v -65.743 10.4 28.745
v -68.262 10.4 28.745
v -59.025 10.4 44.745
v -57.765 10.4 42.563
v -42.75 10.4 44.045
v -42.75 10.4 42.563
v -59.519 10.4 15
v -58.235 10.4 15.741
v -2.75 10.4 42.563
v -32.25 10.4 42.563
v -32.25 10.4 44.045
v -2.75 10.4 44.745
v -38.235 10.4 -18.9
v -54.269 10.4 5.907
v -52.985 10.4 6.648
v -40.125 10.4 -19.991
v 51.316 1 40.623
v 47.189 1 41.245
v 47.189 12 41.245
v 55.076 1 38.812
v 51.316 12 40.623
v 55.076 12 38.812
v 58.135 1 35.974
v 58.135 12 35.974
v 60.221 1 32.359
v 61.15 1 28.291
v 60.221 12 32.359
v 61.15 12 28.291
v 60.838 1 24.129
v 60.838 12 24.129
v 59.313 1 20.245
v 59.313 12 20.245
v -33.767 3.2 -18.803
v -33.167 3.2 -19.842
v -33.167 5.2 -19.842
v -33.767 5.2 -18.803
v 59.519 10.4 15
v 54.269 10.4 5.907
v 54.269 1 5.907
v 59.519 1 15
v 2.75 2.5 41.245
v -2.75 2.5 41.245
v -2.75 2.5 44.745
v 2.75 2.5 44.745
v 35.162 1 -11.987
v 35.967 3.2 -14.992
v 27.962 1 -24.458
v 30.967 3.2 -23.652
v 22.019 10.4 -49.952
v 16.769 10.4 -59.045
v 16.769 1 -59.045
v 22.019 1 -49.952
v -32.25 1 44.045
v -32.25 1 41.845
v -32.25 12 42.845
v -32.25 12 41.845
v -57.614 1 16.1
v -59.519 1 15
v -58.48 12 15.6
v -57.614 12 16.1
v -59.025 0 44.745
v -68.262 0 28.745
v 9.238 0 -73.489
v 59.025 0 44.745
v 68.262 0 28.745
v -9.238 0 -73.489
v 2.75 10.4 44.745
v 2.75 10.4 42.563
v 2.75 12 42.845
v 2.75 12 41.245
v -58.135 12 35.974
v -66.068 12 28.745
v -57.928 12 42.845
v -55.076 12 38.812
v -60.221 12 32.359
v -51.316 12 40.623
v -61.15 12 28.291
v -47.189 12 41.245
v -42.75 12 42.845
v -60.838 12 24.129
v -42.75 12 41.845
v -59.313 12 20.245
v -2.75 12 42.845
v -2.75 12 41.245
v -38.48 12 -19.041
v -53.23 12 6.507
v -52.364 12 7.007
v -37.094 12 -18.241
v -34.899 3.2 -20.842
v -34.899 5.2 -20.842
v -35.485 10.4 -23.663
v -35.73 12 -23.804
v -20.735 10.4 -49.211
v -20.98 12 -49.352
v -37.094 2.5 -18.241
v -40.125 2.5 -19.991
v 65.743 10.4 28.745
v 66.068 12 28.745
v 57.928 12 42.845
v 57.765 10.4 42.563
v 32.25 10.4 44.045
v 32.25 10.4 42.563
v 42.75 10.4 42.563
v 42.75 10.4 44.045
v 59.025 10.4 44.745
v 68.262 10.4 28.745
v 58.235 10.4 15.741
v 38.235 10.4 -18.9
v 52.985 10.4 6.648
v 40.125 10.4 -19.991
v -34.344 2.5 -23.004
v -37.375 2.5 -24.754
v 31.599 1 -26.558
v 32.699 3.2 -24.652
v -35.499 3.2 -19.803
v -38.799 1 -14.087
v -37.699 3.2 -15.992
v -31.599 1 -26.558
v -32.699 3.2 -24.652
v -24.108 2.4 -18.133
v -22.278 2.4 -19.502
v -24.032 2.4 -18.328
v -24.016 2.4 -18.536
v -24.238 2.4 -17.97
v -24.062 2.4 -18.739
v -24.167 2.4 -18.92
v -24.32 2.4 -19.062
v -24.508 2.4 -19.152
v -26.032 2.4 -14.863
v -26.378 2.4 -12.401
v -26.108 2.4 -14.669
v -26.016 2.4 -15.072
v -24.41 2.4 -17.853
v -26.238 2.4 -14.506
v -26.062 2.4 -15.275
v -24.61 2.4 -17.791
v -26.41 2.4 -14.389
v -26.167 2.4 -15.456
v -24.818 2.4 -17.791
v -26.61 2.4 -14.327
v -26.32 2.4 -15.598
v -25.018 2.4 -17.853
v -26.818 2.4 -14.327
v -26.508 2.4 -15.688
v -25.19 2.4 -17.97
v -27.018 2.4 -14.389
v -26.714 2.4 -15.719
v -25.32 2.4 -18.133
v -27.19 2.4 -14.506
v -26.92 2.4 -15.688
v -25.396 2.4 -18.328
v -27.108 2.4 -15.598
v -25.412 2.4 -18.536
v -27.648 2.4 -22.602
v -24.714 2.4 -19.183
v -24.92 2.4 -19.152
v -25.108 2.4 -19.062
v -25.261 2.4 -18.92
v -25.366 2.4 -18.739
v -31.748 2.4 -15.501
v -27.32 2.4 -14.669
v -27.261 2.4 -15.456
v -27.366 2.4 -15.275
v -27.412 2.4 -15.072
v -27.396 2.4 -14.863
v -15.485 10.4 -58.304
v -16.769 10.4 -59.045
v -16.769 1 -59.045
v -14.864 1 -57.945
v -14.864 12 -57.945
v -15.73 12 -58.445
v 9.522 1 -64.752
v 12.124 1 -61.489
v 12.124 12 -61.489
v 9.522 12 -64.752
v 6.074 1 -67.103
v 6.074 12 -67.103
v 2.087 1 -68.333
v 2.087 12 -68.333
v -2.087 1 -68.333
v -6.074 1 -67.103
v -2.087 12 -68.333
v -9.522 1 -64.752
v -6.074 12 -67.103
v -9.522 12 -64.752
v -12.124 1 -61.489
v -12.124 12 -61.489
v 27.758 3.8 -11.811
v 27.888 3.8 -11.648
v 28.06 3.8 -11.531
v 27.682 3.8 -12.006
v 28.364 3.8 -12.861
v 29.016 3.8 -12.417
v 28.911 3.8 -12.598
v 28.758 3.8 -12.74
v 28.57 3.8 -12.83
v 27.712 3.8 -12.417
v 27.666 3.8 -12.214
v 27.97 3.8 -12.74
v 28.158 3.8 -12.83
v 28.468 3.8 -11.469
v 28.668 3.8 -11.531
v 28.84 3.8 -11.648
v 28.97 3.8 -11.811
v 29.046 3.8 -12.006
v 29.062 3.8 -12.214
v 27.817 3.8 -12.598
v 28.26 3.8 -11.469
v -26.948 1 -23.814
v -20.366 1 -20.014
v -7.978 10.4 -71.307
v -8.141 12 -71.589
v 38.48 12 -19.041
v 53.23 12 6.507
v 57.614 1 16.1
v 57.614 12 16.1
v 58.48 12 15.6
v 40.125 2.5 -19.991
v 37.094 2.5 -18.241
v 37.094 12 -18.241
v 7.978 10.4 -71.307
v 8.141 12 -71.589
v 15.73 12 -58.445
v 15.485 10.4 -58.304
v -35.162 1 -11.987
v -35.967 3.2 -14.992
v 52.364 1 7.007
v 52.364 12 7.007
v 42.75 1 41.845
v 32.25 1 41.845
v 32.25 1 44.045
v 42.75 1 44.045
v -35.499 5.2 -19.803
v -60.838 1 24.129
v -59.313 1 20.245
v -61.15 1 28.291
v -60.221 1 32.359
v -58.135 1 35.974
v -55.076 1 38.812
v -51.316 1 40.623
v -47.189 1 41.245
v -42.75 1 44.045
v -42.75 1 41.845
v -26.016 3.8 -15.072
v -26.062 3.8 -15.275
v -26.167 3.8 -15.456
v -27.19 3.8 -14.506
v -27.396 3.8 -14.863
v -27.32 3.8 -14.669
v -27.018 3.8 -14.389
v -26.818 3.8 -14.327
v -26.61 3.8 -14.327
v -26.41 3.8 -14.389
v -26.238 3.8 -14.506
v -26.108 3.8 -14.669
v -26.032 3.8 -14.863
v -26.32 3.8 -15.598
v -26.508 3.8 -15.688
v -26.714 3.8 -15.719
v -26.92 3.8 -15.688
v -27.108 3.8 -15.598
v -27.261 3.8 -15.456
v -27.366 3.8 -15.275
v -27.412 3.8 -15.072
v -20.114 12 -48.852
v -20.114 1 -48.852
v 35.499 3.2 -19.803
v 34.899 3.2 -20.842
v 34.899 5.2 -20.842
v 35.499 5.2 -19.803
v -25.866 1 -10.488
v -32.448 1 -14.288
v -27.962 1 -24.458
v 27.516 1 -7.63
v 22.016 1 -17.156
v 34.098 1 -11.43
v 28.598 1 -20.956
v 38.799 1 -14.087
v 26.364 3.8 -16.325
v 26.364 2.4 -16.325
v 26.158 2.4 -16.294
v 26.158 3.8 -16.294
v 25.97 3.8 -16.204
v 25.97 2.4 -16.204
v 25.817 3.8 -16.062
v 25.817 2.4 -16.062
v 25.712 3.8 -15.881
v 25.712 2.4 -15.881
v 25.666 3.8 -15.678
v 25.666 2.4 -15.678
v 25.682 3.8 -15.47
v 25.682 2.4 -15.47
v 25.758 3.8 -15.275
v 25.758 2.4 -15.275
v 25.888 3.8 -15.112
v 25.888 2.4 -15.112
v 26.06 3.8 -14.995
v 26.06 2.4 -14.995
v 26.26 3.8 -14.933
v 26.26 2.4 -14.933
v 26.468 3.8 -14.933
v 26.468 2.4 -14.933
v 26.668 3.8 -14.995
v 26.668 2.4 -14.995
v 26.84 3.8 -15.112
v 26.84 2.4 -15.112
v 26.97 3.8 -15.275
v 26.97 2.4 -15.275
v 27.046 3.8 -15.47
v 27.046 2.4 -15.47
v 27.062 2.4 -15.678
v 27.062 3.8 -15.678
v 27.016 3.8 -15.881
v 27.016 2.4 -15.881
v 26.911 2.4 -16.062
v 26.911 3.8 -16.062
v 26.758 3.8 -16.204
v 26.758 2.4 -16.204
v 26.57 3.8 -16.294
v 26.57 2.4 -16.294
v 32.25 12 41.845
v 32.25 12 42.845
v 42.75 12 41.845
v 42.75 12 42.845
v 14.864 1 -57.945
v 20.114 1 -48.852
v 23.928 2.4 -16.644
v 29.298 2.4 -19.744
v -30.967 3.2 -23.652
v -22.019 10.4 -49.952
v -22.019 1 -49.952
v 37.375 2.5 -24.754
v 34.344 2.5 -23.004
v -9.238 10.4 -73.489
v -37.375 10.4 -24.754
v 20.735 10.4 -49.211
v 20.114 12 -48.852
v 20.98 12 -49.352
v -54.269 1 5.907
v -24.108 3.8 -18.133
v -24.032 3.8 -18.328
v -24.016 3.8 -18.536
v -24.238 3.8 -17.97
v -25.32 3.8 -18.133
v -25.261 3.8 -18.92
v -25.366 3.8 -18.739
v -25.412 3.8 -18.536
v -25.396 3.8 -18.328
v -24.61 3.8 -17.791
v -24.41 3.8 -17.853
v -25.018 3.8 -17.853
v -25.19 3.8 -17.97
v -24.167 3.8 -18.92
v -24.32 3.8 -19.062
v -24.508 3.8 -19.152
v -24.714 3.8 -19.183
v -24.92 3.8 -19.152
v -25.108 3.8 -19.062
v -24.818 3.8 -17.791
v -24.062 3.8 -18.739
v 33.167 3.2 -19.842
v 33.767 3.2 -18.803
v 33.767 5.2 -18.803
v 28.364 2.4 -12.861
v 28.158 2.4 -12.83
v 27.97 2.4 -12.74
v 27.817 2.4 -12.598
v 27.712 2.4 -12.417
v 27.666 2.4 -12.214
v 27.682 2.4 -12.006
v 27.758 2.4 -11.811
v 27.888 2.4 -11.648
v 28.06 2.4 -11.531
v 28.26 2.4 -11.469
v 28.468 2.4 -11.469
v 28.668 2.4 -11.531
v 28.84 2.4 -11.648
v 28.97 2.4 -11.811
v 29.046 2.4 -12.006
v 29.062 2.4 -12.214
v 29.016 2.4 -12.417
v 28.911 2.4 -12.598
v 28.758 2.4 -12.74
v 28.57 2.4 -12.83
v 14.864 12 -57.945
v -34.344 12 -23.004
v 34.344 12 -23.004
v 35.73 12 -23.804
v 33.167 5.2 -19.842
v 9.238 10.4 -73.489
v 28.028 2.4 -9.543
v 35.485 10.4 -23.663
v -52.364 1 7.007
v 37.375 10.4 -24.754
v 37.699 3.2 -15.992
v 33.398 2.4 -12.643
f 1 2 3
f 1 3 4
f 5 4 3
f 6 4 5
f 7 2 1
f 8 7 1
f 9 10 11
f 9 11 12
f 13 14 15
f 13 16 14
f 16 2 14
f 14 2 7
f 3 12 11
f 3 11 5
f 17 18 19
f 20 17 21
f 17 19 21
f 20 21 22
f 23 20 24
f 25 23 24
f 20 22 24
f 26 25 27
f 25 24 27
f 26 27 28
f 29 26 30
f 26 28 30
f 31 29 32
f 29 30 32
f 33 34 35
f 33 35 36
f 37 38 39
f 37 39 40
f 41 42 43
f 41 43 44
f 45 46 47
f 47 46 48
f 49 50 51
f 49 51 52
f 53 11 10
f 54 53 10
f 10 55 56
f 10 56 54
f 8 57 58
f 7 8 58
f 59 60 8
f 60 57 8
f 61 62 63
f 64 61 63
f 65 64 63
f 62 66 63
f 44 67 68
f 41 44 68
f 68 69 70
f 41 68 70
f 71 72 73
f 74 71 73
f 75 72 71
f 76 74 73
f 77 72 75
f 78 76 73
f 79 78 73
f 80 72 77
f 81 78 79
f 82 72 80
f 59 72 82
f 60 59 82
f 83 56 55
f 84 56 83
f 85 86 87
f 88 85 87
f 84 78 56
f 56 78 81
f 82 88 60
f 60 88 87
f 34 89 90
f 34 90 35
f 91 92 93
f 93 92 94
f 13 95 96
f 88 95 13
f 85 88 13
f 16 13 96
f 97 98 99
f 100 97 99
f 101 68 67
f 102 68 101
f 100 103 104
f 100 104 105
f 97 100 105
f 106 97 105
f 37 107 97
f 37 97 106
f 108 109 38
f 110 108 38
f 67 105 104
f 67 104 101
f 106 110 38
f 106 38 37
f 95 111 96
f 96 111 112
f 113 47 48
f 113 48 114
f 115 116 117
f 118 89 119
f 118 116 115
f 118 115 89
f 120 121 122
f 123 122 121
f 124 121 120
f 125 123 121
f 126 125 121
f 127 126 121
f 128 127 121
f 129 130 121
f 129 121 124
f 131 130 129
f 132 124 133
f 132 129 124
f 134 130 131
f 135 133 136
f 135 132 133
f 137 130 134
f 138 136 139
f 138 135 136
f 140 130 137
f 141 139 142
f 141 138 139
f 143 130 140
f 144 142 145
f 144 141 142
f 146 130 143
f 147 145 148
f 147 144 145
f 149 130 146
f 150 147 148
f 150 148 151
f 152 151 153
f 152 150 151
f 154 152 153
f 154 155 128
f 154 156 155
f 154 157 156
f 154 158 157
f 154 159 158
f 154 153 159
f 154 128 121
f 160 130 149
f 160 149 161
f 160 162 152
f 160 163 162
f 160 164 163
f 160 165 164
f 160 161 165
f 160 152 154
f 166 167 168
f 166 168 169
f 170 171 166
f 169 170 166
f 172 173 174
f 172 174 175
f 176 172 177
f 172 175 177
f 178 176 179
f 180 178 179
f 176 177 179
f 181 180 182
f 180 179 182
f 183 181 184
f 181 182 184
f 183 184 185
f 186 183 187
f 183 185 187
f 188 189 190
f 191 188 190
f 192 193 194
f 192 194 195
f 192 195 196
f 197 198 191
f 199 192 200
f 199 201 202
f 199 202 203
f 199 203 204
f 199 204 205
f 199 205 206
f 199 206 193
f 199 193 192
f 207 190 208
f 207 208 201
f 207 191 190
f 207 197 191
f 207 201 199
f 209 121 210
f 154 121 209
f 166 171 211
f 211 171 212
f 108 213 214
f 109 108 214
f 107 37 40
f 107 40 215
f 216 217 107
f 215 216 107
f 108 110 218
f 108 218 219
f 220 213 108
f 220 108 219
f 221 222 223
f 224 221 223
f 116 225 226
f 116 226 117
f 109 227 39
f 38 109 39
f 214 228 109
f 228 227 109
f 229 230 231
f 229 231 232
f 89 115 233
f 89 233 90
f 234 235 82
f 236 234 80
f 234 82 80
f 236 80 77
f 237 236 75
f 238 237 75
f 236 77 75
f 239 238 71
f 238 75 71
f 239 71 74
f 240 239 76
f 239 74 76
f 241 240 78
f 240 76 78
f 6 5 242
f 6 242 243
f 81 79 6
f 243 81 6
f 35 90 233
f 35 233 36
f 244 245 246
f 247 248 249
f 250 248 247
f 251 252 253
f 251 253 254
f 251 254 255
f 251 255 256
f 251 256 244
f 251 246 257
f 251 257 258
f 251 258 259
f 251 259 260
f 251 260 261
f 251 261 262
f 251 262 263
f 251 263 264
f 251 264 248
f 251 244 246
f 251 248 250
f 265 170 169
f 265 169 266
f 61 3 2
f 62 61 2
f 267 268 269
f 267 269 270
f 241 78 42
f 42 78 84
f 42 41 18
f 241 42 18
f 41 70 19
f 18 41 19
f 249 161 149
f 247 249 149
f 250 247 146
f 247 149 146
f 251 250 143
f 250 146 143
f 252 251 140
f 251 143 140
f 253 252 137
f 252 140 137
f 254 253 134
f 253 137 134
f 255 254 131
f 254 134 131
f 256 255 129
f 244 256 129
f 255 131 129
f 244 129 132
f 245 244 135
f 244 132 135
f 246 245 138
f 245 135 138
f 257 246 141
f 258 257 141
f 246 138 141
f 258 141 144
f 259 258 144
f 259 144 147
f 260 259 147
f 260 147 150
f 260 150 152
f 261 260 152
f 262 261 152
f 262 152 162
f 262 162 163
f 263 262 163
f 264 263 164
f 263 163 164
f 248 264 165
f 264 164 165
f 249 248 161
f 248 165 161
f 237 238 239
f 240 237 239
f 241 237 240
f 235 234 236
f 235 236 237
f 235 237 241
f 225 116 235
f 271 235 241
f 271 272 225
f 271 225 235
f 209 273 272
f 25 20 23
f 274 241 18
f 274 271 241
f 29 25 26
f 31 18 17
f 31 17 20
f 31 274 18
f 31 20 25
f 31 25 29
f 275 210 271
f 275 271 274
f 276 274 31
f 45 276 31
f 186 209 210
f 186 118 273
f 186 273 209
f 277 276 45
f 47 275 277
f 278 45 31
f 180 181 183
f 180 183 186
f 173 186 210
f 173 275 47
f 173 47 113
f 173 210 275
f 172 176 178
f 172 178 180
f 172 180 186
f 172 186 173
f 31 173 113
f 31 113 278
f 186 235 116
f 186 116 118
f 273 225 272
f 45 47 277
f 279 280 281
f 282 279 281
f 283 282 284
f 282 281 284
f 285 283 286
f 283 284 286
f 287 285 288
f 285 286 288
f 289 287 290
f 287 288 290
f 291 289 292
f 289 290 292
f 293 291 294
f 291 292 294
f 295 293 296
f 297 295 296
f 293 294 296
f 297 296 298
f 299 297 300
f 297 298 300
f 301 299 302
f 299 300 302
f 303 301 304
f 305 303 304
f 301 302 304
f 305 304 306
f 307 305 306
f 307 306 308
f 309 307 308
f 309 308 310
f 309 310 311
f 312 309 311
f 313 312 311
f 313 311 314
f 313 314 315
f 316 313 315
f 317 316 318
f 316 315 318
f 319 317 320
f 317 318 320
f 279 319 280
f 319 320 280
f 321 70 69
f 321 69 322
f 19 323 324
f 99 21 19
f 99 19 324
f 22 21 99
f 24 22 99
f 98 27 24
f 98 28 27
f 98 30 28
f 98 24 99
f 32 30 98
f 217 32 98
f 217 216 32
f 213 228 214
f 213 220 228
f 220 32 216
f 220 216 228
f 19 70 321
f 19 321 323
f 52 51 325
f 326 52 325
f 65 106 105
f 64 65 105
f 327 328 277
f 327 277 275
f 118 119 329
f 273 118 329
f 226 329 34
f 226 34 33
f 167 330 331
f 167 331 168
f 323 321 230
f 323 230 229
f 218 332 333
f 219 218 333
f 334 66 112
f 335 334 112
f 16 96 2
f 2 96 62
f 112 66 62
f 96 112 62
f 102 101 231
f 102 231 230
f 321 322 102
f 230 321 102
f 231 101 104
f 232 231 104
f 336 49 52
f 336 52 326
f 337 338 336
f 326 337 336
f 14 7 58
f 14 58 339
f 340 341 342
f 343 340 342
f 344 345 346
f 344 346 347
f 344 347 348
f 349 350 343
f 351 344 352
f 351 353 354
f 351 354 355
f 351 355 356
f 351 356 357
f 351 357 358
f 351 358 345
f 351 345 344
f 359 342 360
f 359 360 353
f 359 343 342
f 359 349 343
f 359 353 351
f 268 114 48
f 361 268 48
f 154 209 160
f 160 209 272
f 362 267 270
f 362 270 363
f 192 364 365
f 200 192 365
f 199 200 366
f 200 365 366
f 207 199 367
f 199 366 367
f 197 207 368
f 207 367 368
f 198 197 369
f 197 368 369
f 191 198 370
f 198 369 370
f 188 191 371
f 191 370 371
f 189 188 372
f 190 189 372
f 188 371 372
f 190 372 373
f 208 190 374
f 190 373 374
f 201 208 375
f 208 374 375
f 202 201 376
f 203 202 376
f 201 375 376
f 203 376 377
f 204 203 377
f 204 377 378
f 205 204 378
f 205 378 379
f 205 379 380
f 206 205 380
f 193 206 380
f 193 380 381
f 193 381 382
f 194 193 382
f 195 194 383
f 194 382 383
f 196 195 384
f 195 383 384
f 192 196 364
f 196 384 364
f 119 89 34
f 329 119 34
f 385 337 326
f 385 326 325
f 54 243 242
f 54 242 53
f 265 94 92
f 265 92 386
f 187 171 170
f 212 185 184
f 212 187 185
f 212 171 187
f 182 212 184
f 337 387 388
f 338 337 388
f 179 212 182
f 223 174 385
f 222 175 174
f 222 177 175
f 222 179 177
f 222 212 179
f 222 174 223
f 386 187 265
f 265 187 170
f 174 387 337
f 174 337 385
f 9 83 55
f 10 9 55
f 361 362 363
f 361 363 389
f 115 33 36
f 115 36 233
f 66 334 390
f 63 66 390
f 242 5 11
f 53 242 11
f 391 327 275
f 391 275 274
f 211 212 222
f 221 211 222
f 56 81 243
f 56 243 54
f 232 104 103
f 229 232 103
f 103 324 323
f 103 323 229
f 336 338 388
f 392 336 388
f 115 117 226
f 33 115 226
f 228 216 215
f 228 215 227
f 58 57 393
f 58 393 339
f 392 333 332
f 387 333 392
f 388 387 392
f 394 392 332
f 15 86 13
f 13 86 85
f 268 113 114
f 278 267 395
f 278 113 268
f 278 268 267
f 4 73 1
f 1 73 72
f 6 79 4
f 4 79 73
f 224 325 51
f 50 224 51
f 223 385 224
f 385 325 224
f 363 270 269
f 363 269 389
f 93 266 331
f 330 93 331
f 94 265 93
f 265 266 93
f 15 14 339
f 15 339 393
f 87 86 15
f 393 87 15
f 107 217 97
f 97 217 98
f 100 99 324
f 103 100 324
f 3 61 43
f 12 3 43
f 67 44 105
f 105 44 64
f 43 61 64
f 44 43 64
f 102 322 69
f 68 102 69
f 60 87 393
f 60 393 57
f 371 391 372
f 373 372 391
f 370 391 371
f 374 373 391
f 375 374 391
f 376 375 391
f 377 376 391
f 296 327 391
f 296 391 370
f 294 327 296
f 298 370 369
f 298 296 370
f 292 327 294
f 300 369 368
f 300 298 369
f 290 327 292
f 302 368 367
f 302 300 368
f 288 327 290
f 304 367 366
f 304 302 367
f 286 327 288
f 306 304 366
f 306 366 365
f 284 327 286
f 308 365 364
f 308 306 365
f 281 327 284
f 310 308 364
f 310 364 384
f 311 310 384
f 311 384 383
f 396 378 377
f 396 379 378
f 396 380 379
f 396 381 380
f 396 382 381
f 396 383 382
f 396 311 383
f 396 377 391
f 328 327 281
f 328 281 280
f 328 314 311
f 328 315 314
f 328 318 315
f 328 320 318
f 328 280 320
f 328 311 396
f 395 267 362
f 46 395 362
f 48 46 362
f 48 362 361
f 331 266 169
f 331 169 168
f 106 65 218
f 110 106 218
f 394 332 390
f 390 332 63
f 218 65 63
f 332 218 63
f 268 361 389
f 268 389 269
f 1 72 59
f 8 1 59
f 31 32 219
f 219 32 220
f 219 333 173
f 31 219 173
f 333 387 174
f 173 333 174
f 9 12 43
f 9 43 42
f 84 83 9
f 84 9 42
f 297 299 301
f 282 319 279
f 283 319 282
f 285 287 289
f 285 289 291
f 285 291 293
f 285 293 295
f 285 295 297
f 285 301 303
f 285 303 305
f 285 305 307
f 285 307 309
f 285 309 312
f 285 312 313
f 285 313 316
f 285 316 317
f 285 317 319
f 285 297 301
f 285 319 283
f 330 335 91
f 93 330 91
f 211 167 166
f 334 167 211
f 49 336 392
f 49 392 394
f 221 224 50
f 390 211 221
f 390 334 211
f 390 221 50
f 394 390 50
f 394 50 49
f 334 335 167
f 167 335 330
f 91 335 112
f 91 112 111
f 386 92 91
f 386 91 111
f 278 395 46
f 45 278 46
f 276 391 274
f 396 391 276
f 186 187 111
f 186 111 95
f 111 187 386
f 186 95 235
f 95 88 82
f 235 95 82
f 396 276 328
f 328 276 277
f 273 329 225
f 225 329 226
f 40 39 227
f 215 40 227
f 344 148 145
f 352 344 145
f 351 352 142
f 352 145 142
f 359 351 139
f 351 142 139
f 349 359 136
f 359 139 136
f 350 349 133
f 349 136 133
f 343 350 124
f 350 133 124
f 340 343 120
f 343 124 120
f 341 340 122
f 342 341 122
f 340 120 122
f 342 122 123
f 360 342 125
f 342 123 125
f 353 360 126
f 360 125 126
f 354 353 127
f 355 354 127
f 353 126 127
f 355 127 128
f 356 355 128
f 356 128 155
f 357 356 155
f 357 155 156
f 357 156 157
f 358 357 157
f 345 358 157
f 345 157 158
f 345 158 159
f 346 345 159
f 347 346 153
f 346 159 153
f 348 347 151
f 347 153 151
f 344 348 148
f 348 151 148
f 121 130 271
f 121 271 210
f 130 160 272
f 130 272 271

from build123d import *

# Parameters (mm, degrees)
BOSS_EXTRU_1_DEPTH                        = 12
ENL_V_MAT_EXTRU_1_DEPTH                   = 119.989845505
ENL_V_MAT_EXTRU_2_DEPTH                   = 11
ESQUISSE4_W                               = 5.5
ESQUISSE4_H                               = 3.5
ENL_V_MAT_EXTRU_3_DEPTH                   = 9.5
BOSS_EXTRU_2_DEPTH                        = 1.4
ESQUISSE13_R                              = 0.7
BOSS_EXTRU_3_DEPTH                        = 1.4
BOSS_EXTRU_6_DEPTH                        = 2.2
BOSS_EXTRU_7_DEPTH                        = 2
CHANFREIN3_SIZE                           = 2.2
CHANFREIN4_SIZE                           = 1.4
R_P_TITION_CIRCULAIRE2_COUNT              = 2
R_P_TITION_CIRCULAIRE2_ANGLE              = 120
CHANFREIN3_OF_R_P_TITION_CIRCULAIRE2_SIZE = 2.2
CHANFREIN4_OF_R_P_TITION_CIRCULAIRE2_SIZE = 1.4
ENL_V_DE_MAT_EXTRU_MINCE1_DEPTH           = 1.6
ENL_V_DE_MAT_EXTRU_MINCE1_DRAFT           = 10
ENL_V_DE_MAT_EXTRU_MINCE1_PROFILE_2_DEPTH = 1.6
ENL_V_DE_MAT_EXTRU_MINCE1_PROFILE_2_DRAFT = 10
ENL_V_DE_MAT_EXTRU_MINCE1_PROFILE_3_DEPTH = 1.6
ENL_V_DE_MAT_EXTRU_MINCE1_PROFILE_3_DRAFT = 10
ESQUISSE18_W                              = 10.5
ESQUISSE18_H                              = 2.2
ENL_V_MAT_EXTRU_10_DEPTH                  = 11


with BuildPart() as part:
    # Esquisse1 → Boss.-Extru.1 (new body)
    with BuildSketch(Plane(origin=(0, 0, 0), x_dir=(1, 0, 0), z_dir=(0, 1, 0))):
        Polygon((-77.5, -44.744645862), (77.5, -44.744645862), (0, 89.489291724), align=None)
    extrude(amount=BOSS_EXTRU_1_DEPTH)

    # Esquisse2 → Enlèv. mat.-Extru.1 (cut, through all)
    with BuildSketch(Plane(origin=(0, 12, 0), x_dir=(1, 0, 0), z_dir=(0, 1, 0))):
        Polygon((-9.237604307, 73.489291724), (9.237604307, 73.489291724), (0, 89.489291724), align=None)
        Polygon((77.5, -44.744645862), (68.262395693, -28.744645862), (59.024791386, -44.744645862), align=None)
        Polygon((-77.5, -44.744645862), (-59.024791386, -44.744645862), (-68.262395693, -28.744645862), align=None)
    extrude(amount=-ENL_V_MAT_EXTRU_1_DEPTH, mode=Mode.SUBTRACT)

    # Esquisse3 → Enlèv. mat.-Extru.2 (cut)
    with BuildSketch(Plane(origin=(0, 12, 0), x_dir=(1, 0, 0), z_dir=(0, 1, 0))):
        with BuildLine():
            Line((59.313466521, -20.244645862), (12.124355653, 61.489291724))
            ThreePointArc((12.124355653, 61.489291724), (0, 68.489291724), (-12.124355653, 61.489291724))
            Line((-12.124355653, 61.489291724), (-59.313466521, -20.244645862))
            ThreePointArc((-59.313466521, -20.244645862), (-59.313466521, -34.244645862), (-47.189110868, -41.244645862))
            Line((-47.189110868, -41.244645862), (47.189110868, -41.244645862))
            ThreePointArc((47.189110868, -41.244645862), (59.313466521, -34.244645862), (59.313466521, -20.244645862))
        make_face()
    extrude(amount=-ENL_V_MAT_EXTRU_2_DEPTH, mode=Mode.SUBTRACT)

    # Esquisse4 → Enlèv. mat.-Extru.3 (cut)
    with BuildSketch(Plane(origin=(0, 12, 0), x_dir=(1, 0, 0), z_dir=(0, 1, 0))):
        Polygon((37.093911087, 18.240753071), (34.343911087, 23.003892792), (37.375, 24.753892792), (40.125, 19.990753071), align=None)
        with Locations((0, -42.994645862)):
            Rectangle(ESQUISSE4_W, ESQUISSE4_H)
        Polygon((-37.375, 24.753892792), (-34.343911087, 23.003892792), (-37.093911087, 18.240753071), (-40.125, 19.990753071), align=None)
    extrude(amount=-ENL_V_MAT_EXTRU_3_DEPTH, mode=Mode.SUBTRACT)

    # Esquisse12 → Boss.-Extru.2 (add)
    with BuildSketch(Plane(origin=(0, 1, 0), x_dir=(1, 0, 0), z_dir=(0, 1, 0))):
        Polygon((23.928401161, 16.64408517), (28.028401161, 9.542676859), (33.397758664, 12.642676859), (29.297758664, 19.74408517), align=None)
    boss_extru_2 = extrude(amount=BOSS_EXTRU_2_DEPTH)

    # Esquisse13 → Boss.-Extru.3 (add)
    with BuildSketch(Plane(origin=(0, 2.4, 0), x_dir=(1, 0, 0), z_dir=(0, 1, 0))):
        with Locations(Location((26.364041807, 15.625431822, 0), (0, 0, 90))):
            Circle(ESQUISSE13_R)
        with Locations(Location((28.364041807, 12.161330207, 0), (0, 0, 90))):
            Circle(ESQUISSE13_R)
    boss_extru_3 = extrude(amount=BOSS_EXTRU_3_DEPTH)

    # Esquisse14 → Boss.-Extru.6 (add)
    with BuildSketch(Plane(origin=(0, 1, 0), x_dir=(1, 0, 0), z_dir=(0, 1, 0))):
        Polygon((32.699295844, 24.65244995), (37.699295844, 15.992195912), (35.967245037, 14.992195912), (30.967245037, 23.65244995), align=None)
    boss_extru_6 = extrude(amount=BOSS_EXTRU_6_DEPTH)

    # Esquisse15 → Boss.-Extru.7 (add)
    with BuildSketch(Plane(origin=(0, 3.2, 0), x_dir=(1, 0, 0), z_dir=(0, 1, 0))):
        Polygon((34.899295844, 20.841938173), (35.499295844, 19.802707689), (33.767245037, 18.802707689), (33.167245037, 19.841938173), align=None)
    boss_extru_7 = extrude(amount=BOSS_EXTRU_7_DEPTH)

    # Chanfrein3
    chanfrein3_edges = [part.edges().sort_by_distance(p)[0] for p in [
        (33.467245037, 1, -19.322322931),
        (36.833270441, 1, -15.492195912),
        (31.833270441, 1, -24.15244995),
    ]]
    chamfer(chanfrein3_edges, length=CHANFREIN3_SIZE - 0.0001)  # a hair under: the kernel refuses the full size

    # Chanfrein4
    chanfrein4_edges = [part.edges().sort_by_distance(p)[0] for p in [
        (26.613079912, 1, -18.19408517),
        (25.978401161, 1, -13.093381015),
        (30.713079912, 1, -11.092676859),
    ]]
    chamfer(chanfrein4_edges, length=CHANFREIN4_SIZE - 0.0001)  # a hair under: the kernel refuses the full size

    # Répétition circulaire2: Boss.-Extru.2, Boss.-Extru.3, Boss.-Extru.6, Boss.-Extru.7 ×2 about axis
    r_p_tition_circulaire2_axis = Axis((0, 0, 0), (0, 1, 0))
    add([boss_extru_2.rotate(r_p_tition_circulaire2_axis, i * R_P_TITION_CIRCULAIRE2_ANGLE / (R_P_TITION_CIRCULAIRE2_COUNT - 1)) for i in range(1, R_P_TITION_CIRCULAIRE2_COUNT)])
    add([boss_extru_3.rotate(r_p_tition_circulaire2_axis, i * R_P_TITION_CIRCULAIRE2_ANGLE / (R_P_TITION_CIRCULAIRE2_COUNT - 1)) for i in range(1, R_P_TITION_CIRCULAIRE2_COUNT)])
    add([boss_extru_6.rotate(r_p_tition_circulaire2_axis, i * R_P_TITION_CIRCULAIRE2_ANGLE / (R_P_TITION_CIRCULAIRE2_COUNT - 1)) for i in range(1, R_P_TITION_CIRCULAIRE2_COUNT)])
    add([boss_extru_7.rotate(r_p_tition_circulaire2_axis, i * R_P_TITION_CIRCULAIRE2_ANGLE / (R_P_TITION_CIRCULAIRE2_COUNT - 1)) for i in range(1, R_P_TITION_CIRCULAIRE2_COUNT)])

    # Chanfrein3 of Répétition circulaire2
    chanfrein3_of_r_p_tition_circulaire2_edges = [part.edges().sort_by_distance(p)[0] for p in [
        (-33.467245037, 1, -19.322322931),
        (-31.833270441, 1, -24.15244995),
        (-36.833270441, 1, -15.492195912),
    ]]
    chamfer(chanfrein3_of_r_p_tition_circulaire2_edges, length=CHANFREIN3_OF_R_P_TITION_CIRCULAIRE2_SIZE - 0.0001)  # a hair under: the kernel refuses the full size

    # Chanfrein4 of Répétition circulaire2
    chanfrein4_of_r_p_tition_circulaire2_edges = [part.edges().sort_by_distance(p)[0] for p in [
        (-29.063079912, 1, -13.950560692),
        (-24.328401161, 1, -15.951264847),
        (-24.963079912, 1, -21.051969003),
    ]]
    chamfer(chanfrein4_of_r_p_tition_circulaire2_edges, length=CHANFREIN4_OF_R_P_TITION_CIRCULAIRE2_SIZE - 0.0001)  # a hair under: the kernel refuses the full size


with BuildPart() as enl_v_de_mat_extru_mince1_tool:
    # Esquisse17 → Enlèv. de mat.-Extru.-Mince1 (with draft: the straight prism first)
    with BuildSketch(Plane(origin=(0, 12, 0), x_dir=(1, 0, 0), z_dir=(0, 1, 0))):
        Polygon((37.375, 24.753892792), (9.237604307, 73.489291724), (-9.237604307, 73.489291724), (-37.375, 24.753892792), (-35.729551733, 23.803892792), (-8.140638796, 71.589291724), (8.140638796, 71.589291724), (35.729551733, 23.803892792), align=None)
    extrude(amount=-ENL_V_DE_MAT_EXTRU_MINCE1_DEPTH)
    # Enlèv. de mat.-Extru.-Mince1: the draft: its side faces are tilted about the plane it starts from
    enl_v_de_mat_extru_mince1_sides = [enl_v_de_mat_extru_mince1_tool.faces().sort_by_distance(p)[0] for p in [
        (23.306302154, 11.2, -49.121592258),
        (0, 11.2, -73.489291724),
        (-23.306302154, 11.2, -49.121592258),
        (-36.552275866, 11.2, -24.278892792),
        (-21.935095264, 11.2, -47.696592258),
        (0, 11.2, -71.589291724),
        (21.935095264, 11.2, -47.696592258),
        (36.552275866, 11.2, -24.278892792),
    ]]
    draft(enl_v_de_mat_extru_mince1_sides, Plane(origin=(0, 12, 0), x_dir=(1, 0, 0), z_dir=(0, 1, 0)), ENL_V_DE_MAT_EXTRU_MINCE1_DRAFT)


with BuildPart() as part_1:
    add(part.part)

    # Enlèv. de mat.-Extru.-Mince1: cut by enl_v_de_mat_extru_mince1_tool
    add(enl_v_de_mat_extru_mince1_tool.part, mode=Mode.SUBTRACT)


with BuildPart() as enl_v_de_mat_extru_mince1_profile_2_tool:
    # Esquisse17 → Enlèv. de mat.-Extru.-Mince1 profile 2 (with draft: the straight prism first)
    with BuildSketch(Plane(origin=(0, 12, 0), x_dir=(1, 0, 0), z_dir=(0, 1, 0))):
        Polygon((-40.125, 19.990753071), (-68.262395693, -28.744645862), (-59.024791386, -44.744645862), (-2.75, -44.744645862), (-2.75, -42.844645862), (-57.927825874, -42.844645862), (-66.06846467, -28.744645862), (-38.479551733, 19.040753071), align=None)
    extrude(amount=-ENL_V_DE_MAT_EXTRU_MINCE1_PROFILE_2_DEPTH)
    # Enlèv. de mat.-Extru.-Mince1 profile 2: the draft: its side faces are tilted about the plane it starts from
    enl_v_de_mat_extru_mince1_profile_2_sides = [enl_v_de_mat_extru_mince1_profile_2_tool.faces().sort_by_distance(p)[0] for p in [
        (-54.193697846, 11.2, 4.376946396),
        (-63.643593539, 11.2, 36.744645862),
        (-30.887395693, 11.2, 44.744645862),
        (-2.75, 11.2, 43.794645862),
        (-30.338912937, 11.2, 42.844645862),
        (-61.998145272, 11.2, 35.794645862),
        (-52.274008201, 11.2, 4.851946396),
        (-39.302275866, 11.2, -19.515753071),
    ]]
    draft(enl_v_de_mat_extru_mince1_profile_2_sides, Plane(origin=(0, 12, 0), x_dir=(1, 0, 0), z_dir=(0, 1, 0)), ENL_V_DE_MAT_EXTRU_MINCE1_PROFILE_2_DRAFT)


with BuildPart() as part_2:
    add(part_1.part)

    # Enlèv. de mat.-Extru.-Mince1 profile 2: cut by enl_v_de_mat_extru_mince1_profile_2_tool
    add(enl_v_de_mat_extru_mince1_profile_2_tool.part, mode=Mode.SUBTRACT)


with BuildPart() as enl_v_de_mat_extru_mince1_profile_3_tool:
    # Esquisse17 → Enlèv. de mat.-Extru.-Mince1 profile 3 (with draft: the straight prism first)
    with BuildSketch(Plane(origin=(0, 12, 0), x_dir=(1, 0, 0), z_dir=(0, 1, 0))):
        Polygon((2.75, -44.744645862), (59.024791386, -44.744645862), (68.262395693, -28.744645862), (40.125, 19.990753071), (38.479551733, 19.040753071), (66.06846467, -28.744645862), (57.927825874, -42.844645862), (2.75, -42.844645862), align=None)
    extrude(amount=-ENL_V_DE_MAT_EXTRU_MINCE1_PROFILE_3_DEPTH)
    # Enlèv. de mat.-Extru.-Mince1 profile 3: the draft: its side faces are tilted about the plane it starts from
    enl_v_de_mat_extru_mince1_profile_3_sides = [enl_v_de_mat_extru_mince1_profile_3_tool.faces().sort_by_distance(p)[0] for p in [
        (30.887395693, 11.2, 44.744645862),
        (63.643593539, 11.2, 36.744645862),
        (54.193697846, 11.2, 4.376946396),
        (39.302275866, 11.2, -19.515753071),
        (52.274008201, 11.2, 4.851946396),
        (61.998145272, 11.2, 35.794645862),
        (30.338912937, 11.2, 42.844645862),
        (2.75, 11.2, 43.794645862),
    ]]
    draft(enl_v_de_mat_extru_mince1_profile_3_sides, Plane(origin=(0, 12, 0), x_dir=(1, 0, 0), z_dir=(0, 1, 0)), ENL_V_DE_MAT_EXTRU_MINCE1_PROFILE_3_DRAFT)


with BuildPart() as part_3:
    add(part_2.part)

    # Enlèv. de mat.-Extru.-Mince1 profile 3: cut by enl_v_de_mat_extru_mince1_profile_3_tool
    add(enl_v_de_mat_extru_mince1_profile_3_tool.part, mode=Mode.SUBTRACT)

    # Esquisse18 → Enlèv. mat.-Extru.10 (cut)
    with BuildSketch(Plane(origin=(0, 12, 0), x_dir=(1, 0, 0), z_dir=(0, 1, 0))):
        with Locations((37.5, -42.944645862)):
            Rectangle(ESQUISSE18_W, ESQUISSE18_H)
        with Locations((-37.5, -42.944645862)):
            Rectangle(ESQUISSE18_W, ESQUISSE18_H)
        Polygon((-52.363526329, -7.006996341), (-57.613526329, -16.100263081), (-59.518782217, -15.000263081), (-54.268782217, -5.906996341), align=None)
        Polygon((-20.113526329, 48.851642203), (-22.018782217, 49.951642203), (-16.768782217, 59.044908943), (-14.863526329, 57.944908943), align=None)
        Polygon((20.113526329, 48.851642203), (14.863526329, 57.944908943), (16.768782217, 59.044908943), (22.018782217, 49.951642203), align=None)
        Polygon((52.363526329, -7.006996341), (54.268782217, -5.906996341), (59.518782217, -15.000263081), (57.613526329, -16.100263081), align=None)
    extrude(amount=-ENL_V_MAT_EXTRU_10_DEPTH, mode=Mode.SUBTRACT)


solid = part_3.part
